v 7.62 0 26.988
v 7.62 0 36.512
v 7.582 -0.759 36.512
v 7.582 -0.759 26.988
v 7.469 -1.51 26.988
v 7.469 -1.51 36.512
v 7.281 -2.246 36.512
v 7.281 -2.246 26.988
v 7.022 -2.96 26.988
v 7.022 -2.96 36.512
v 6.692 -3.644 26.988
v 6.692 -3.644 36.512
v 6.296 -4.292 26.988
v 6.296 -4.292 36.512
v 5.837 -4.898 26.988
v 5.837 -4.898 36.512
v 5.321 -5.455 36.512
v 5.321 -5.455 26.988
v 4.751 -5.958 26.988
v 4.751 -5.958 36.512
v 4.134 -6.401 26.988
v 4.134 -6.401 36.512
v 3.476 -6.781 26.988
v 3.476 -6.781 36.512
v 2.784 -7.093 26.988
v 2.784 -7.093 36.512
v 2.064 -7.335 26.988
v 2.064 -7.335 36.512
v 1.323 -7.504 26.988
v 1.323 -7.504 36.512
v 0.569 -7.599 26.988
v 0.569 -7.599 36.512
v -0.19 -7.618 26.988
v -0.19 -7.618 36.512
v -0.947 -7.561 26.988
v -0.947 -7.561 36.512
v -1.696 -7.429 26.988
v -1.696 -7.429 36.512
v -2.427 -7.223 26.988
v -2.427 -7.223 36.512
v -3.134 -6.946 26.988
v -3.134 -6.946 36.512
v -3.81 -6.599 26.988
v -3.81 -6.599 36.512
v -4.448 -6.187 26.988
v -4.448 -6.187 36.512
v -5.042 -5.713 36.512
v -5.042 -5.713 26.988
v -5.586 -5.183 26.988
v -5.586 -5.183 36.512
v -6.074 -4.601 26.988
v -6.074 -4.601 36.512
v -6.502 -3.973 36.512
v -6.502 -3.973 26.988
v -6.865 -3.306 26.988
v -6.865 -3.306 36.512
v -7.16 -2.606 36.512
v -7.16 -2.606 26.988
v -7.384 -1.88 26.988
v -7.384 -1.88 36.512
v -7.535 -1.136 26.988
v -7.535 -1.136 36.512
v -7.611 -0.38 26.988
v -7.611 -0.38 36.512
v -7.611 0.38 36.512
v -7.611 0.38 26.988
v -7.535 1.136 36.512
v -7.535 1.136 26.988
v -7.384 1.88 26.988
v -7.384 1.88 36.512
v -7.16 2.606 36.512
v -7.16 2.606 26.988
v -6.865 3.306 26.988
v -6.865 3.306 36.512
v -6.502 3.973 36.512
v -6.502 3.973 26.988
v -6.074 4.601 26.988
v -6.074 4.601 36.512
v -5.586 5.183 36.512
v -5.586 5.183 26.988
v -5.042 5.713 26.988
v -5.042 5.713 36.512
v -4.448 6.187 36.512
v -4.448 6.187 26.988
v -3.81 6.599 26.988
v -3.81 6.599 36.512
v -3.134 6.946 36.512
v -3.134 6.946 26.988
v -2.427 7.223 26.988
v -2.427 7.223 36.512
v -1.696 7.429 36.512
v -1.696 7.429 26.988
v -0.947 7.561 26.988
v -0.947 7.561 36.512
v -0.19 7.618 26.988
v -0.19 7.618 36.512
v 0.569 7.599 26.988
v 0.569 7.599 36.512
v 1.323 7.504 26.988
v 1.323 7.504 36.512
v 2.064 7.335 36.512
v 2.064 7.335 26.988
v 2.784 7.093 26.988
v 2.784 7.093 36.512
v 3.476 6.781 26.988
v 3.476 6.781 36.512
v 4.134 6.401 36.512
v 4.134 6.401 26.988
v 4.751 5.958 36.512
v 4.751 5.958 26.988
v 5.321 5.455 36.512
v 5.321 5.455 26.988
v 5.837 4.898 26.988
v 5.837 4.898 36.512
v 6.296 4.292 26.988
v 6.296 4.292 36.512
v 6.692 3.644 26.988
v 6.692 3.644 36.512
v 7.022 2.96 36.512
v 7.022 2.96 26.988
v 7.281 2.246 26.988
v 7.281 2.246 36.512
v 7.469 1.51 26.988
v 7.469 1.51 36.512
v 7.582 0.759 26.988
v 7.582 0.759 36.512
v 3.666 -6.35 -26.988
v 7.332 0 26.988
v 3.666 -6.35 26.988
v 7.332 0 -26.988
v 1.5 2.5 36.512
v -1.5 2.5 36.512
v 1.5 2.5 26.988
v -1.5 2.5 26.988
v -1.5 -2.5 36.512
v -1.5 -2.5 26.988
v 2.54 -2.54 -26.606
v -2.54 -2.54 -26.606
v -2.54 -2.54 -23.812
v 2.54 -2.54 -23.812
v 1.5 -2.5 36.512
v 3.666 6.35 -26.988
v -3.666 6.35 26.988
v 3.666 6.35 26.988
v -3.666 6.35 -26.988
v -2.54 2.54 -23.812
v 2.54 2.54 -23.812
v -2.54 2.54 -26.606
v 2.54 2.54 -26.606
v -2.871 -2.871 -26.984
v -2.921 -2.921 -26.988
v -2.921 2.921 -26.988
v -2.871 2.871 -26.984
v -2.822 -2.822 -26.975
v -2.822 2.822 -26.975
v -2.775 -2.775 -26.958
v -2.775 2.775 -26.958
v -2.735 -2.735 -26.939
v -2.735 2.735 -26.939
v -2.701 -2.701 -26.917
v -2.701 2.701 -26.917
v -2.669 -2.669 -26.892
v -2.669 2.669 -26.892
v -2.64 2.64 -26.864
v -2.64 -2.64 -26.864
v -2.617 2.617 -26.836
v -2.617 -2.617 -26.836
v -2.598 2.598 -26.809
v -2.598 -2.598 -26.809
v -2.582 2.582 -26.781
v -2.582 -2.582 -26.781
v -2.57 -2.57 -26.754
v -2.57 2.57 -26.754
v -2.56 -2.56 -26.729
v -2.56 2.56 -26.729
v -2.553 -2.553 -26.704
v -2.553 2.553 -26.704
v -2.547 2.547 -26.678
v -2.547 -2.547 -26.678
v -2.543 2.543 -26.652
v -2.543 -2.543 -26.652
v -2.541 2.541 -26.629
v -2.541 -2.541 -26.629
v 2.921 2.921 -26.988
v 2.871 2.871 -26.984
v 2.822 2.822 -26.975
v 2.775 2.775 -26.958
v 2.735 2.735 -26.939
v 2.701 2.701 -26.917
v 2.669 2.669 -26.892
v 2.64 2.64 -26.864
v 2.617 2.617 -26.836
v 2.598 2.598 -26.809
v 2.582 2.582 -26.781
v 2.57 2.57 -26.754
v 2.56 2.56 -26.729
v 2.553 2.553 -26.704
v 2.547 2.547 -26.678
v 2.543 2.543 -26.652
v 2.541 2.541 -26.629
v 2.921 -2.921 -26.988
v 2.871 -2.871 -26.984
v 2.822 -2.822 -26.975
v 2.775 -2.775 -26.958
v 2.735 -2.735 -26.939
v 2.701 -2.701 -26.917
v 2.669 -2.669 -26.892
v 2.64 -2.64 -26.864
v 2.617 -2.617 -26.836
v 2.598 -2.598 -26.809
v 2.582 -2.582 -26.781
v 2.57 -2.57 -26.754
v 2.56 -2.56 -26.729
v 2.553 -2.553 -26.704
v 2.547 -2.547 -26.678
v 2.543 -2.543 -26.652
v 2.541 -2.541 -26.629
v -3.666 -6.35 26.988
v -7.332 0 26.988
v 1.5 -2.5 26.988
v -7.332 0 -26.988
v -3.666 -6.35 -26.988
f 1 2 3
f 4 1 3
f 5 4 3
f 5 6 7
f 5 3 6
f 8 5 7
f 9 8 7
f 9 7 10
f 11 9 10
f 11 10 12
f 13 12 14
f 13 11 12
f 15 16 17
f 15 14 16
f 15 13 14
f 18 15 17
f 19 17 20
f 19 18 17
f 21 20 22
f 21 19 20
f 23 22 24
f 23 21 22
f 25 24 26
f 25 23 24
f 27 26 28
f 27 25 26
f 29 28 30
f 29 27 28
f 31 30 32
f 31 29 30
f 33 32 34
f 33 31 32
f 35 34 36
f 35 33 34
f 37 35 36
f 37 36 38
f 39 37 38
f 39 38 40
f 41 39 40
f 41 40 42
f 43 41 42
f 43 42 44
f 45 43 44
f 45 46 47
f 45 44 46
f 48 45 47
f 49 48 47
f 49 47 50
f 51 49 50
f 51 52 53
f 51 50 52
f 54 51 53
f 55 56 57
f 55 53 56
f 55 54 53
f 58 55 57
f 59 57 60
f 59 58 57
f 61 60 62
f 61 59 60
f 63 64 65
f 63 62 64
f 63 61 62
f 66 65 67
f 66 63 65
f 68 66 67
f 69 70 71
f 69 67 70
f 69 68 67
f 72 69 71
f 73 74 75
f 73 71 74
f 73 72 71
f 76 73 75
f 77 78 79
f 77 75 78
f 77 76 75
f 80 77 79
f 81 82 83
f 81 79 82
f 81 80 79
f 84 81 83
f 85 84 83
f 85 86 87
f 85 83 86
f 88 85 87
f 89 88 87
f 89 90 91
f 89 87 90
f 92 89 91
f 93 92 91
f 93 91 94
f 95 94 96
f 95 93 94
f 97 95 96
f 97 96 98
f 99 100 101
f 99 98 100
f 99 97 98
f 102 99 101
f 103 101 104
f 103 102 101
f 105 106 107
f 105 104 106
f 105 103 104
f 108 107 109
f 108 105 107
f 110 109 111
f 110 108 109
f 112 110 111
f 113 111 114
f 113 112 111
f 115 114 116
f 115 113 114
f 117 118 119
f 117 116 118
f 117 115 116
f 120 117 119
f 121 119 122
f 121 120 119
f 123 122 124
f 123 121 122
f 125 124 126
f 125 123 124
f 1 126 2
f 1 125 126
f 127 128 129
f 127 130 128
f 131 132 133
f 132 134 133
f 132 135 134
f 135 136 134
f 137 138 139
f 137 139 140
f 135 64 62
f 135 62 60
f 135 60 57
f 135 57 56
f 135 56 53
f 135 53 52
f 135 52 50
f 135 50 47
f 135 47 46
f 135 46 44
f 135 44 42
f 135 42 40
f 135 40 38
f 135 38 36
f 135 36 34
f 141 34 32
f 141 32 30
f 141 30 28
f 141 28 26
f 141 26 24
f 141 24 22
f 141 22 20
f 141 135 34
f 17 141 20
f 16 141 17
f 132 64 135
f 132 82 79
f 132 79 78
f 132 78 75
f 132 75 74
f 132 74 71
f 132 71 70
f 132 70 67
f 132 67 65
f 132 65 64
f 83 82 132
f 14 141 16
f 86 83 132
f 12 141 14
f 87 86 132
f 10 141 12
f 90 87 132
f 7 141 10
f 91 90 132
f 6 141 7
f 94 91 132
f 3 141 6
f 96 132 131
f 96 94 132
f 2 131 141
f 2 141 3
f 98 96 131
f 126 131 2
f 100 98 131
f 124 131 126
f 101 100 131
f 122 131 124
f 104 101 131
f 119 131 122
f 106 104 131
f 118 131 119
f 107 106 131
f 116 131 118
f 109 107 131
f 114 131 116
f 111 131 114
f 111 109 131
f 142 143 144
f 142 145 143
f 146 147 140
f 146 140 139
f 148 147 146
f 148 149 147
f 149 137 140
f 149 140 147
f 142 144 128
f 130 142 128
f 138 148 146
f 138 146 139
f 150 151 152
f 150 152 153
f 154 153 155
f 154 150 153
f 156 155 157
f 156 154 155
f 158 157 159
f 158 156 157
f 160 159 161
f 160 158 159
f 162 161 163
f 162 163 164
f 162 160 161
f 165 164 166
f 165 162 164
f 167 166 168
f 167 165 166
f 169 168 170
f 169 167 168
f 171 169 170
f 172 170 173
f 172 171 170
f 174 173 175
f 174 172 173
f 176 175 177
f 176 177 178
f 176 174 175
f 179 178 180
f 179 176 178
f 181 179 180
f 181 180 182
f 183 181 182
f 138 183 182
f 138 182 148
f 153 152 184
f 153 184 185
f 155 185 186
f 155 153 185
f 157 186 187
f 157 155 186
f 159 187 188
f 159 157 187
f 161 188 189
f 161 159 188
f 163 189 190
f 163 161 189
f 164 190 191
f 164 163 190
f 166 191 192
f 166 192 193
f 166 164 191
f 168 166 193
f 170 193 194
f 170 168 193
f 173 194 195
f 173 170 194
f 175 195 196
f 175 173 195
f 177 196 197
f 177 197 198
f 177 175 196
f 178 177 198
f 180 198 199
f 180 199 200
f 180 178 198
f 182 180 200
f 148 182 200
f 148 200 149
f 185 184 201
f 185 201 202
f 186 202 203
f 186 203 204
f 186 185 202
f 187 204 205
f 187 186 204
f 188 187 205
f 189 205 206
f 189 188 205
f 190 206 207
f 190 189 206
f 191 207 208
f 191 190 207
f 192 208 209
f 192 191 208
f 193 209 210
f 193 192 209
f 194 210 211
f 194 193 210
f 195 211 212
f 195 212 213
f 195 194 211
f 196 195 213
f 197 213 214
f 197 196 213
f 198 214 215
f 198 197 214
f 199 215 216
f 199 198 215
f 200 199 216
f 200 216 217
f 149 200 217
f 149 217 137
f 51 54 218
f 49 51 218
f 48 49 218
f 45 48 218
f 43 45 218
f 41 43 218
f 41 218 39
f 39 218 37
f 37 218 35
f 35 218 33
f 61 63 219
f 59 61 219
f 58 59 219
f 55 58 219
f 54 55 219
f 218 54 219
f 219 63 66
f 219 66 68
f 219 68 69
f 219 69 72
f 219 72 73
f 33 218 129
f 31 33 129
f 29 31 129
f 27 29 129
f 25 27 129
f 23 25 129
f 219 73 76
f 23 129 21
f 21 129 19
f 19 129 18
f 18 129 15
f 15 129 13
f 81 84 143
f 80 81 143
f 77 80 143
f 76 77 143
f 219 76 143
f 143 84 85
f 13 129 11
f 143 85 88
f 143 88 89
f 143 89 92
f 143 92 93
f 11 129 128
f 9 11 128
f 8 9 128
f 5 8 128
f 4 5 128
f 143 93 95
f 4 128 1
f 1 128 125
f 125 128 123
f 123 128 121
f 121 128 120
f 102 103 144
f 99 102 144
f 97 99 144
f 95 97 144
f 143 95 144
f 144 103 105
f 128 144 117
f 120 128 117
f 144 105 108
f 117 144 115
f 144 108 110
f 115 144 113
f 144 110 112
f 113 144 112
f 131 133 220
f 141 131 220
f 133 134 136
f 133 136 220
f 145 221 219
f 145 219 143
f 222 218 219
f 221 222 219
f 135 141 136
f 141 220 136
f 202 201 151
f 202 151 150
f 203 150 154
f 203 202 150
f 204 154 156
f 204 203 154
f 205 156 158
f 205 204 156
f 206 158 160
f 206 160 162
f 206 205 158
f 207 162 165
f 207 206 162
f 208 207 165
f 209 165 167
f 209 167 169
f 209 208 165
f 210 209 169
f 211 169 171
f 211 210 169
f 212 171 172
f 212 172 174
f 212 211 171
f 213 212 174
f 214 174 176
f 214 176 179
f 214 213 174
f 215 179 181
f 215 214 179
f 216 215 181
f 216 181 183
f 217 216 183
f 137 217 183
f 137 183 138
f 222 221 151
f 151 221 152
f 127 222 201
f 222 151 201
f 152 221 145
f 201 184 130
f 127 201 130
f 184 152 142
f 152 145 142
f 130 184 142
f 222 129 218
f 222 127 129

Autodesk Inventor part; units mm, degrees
ref_plane "YZ Plane" through (0, 0, 0) normal (1, 0, 0) x (0, 1, 0)
ref_plane "XZ Plane" through (0, 0, 0) normal (0, 1, 0) x (-1, 0, 0)
ref_plane "XY Plane" through (0, 0, 0) normal (0, 0, 1) x (1, 0, 0)
sketch "Sketch1" plane through (0, 0, 0) normal (0, 0, 1) x (1, 0, 0)
  line L0 (-7.3323, 0) -> (-3.6662, 6.35)
  line L1 (-3.6662, 6.35) -> (3.6662, 6.35)
  line L2 (3.6662, 6.35) -> (7.3323, 0)
  line L3 (7.3323, 0) -> (3.6662, -6.35)
  line L4 (3.6662, -6.35) -> (-3.6662, -6.35)
  line L5 (-3.6662, -6.35) -> (-7.3323, 0)
  circle A0 centre (0, 0) radius 1.5923 construction
  dimension "d0" = 12.7
extrude "Extrusion1" add sketch "Sketch1" along normal mid plane 53.975
sketch "Sketch2" plane through (0, 0, 26.9875) normal (0, 0, 1) x (1, 0, 0)
  line L0 (3.6662, 6.35) -> (-3.6662, 6.35) projected
  line L1 (-3.6662, -6.35) -> (3.6662, -6.35) projected
  line L2 (3.6662, -6.35) -> (7.3323, 0) projected
  line L3 (7.3323, 0) -> (3.6662, 6.35) projected
  line L4 (3.6662, 6.35) -> (-3.6662, 6.35) projected
  line L5 (-3.6662, 6.35) -> (-7.3323, 0) projected
  line L6 (-7.3323, 0) -> (-3.6662, -6.35) projected
  circle A0 centre (0, 0) radius 7.62
  line L7 (1.5, -2.5) -> (-1.5, -2.5)
  line L8 (-1.5, -2.5) -> (-1.5, 2.5)
  line L9 (-1.5, 2.5) -> (1.5, 2.5)
  line L10 (1.5, 2.5) -> (1.5, -2.5)
  line L11 (1.5, -2.5) -> (-1.5, 2.5) construction
  line L12 (-1.5, -2.5) -> (1.5, 2.5) construction
  dimension "d5" = 15.24
  dimension "d6" = 3
  dimension "d7" = 5
extrude "Extrusion2" add sketch "Sketch2" along normal blind 9.525 contours L3 L2 L1 L6 L5 L0 | A0
sketch "Sketch3" plane through (0, 0, -26.9875) normal (0, 0, -1) x (-1, 0, 0)
  line L0 (2.54, -2.54) -> (-2.54, -2.54)
  line L1 (-2.54, -2.54) -> (-2.54, 2.54)
  line L2 (-2.54, 2.54) -> (2.54, 2.54)
  line L3 (2.54, 2.54) -> (2.54, -2.54)
  line L4 (2.54, -2.54) -> (-2.54, 2.54) construction
  line L5 (-2.54, -2.54) -> (2.54, 2.54) construction
  point P0 (0, 0)
  dimension "d11" = 5.08
  dimension "d12" = 5.08
extrude "Extrusion3" cut sketch "Sketch3" against normal blind 3.175
fillet "Fillet1" radius 0.381 4 edges at (2.54, 0, -26.9875) (0, 2.54, -26.9875) (0, -2.54, -26.9875) (-2.54, 0, -26.9875)
properties part number "Shaft"
